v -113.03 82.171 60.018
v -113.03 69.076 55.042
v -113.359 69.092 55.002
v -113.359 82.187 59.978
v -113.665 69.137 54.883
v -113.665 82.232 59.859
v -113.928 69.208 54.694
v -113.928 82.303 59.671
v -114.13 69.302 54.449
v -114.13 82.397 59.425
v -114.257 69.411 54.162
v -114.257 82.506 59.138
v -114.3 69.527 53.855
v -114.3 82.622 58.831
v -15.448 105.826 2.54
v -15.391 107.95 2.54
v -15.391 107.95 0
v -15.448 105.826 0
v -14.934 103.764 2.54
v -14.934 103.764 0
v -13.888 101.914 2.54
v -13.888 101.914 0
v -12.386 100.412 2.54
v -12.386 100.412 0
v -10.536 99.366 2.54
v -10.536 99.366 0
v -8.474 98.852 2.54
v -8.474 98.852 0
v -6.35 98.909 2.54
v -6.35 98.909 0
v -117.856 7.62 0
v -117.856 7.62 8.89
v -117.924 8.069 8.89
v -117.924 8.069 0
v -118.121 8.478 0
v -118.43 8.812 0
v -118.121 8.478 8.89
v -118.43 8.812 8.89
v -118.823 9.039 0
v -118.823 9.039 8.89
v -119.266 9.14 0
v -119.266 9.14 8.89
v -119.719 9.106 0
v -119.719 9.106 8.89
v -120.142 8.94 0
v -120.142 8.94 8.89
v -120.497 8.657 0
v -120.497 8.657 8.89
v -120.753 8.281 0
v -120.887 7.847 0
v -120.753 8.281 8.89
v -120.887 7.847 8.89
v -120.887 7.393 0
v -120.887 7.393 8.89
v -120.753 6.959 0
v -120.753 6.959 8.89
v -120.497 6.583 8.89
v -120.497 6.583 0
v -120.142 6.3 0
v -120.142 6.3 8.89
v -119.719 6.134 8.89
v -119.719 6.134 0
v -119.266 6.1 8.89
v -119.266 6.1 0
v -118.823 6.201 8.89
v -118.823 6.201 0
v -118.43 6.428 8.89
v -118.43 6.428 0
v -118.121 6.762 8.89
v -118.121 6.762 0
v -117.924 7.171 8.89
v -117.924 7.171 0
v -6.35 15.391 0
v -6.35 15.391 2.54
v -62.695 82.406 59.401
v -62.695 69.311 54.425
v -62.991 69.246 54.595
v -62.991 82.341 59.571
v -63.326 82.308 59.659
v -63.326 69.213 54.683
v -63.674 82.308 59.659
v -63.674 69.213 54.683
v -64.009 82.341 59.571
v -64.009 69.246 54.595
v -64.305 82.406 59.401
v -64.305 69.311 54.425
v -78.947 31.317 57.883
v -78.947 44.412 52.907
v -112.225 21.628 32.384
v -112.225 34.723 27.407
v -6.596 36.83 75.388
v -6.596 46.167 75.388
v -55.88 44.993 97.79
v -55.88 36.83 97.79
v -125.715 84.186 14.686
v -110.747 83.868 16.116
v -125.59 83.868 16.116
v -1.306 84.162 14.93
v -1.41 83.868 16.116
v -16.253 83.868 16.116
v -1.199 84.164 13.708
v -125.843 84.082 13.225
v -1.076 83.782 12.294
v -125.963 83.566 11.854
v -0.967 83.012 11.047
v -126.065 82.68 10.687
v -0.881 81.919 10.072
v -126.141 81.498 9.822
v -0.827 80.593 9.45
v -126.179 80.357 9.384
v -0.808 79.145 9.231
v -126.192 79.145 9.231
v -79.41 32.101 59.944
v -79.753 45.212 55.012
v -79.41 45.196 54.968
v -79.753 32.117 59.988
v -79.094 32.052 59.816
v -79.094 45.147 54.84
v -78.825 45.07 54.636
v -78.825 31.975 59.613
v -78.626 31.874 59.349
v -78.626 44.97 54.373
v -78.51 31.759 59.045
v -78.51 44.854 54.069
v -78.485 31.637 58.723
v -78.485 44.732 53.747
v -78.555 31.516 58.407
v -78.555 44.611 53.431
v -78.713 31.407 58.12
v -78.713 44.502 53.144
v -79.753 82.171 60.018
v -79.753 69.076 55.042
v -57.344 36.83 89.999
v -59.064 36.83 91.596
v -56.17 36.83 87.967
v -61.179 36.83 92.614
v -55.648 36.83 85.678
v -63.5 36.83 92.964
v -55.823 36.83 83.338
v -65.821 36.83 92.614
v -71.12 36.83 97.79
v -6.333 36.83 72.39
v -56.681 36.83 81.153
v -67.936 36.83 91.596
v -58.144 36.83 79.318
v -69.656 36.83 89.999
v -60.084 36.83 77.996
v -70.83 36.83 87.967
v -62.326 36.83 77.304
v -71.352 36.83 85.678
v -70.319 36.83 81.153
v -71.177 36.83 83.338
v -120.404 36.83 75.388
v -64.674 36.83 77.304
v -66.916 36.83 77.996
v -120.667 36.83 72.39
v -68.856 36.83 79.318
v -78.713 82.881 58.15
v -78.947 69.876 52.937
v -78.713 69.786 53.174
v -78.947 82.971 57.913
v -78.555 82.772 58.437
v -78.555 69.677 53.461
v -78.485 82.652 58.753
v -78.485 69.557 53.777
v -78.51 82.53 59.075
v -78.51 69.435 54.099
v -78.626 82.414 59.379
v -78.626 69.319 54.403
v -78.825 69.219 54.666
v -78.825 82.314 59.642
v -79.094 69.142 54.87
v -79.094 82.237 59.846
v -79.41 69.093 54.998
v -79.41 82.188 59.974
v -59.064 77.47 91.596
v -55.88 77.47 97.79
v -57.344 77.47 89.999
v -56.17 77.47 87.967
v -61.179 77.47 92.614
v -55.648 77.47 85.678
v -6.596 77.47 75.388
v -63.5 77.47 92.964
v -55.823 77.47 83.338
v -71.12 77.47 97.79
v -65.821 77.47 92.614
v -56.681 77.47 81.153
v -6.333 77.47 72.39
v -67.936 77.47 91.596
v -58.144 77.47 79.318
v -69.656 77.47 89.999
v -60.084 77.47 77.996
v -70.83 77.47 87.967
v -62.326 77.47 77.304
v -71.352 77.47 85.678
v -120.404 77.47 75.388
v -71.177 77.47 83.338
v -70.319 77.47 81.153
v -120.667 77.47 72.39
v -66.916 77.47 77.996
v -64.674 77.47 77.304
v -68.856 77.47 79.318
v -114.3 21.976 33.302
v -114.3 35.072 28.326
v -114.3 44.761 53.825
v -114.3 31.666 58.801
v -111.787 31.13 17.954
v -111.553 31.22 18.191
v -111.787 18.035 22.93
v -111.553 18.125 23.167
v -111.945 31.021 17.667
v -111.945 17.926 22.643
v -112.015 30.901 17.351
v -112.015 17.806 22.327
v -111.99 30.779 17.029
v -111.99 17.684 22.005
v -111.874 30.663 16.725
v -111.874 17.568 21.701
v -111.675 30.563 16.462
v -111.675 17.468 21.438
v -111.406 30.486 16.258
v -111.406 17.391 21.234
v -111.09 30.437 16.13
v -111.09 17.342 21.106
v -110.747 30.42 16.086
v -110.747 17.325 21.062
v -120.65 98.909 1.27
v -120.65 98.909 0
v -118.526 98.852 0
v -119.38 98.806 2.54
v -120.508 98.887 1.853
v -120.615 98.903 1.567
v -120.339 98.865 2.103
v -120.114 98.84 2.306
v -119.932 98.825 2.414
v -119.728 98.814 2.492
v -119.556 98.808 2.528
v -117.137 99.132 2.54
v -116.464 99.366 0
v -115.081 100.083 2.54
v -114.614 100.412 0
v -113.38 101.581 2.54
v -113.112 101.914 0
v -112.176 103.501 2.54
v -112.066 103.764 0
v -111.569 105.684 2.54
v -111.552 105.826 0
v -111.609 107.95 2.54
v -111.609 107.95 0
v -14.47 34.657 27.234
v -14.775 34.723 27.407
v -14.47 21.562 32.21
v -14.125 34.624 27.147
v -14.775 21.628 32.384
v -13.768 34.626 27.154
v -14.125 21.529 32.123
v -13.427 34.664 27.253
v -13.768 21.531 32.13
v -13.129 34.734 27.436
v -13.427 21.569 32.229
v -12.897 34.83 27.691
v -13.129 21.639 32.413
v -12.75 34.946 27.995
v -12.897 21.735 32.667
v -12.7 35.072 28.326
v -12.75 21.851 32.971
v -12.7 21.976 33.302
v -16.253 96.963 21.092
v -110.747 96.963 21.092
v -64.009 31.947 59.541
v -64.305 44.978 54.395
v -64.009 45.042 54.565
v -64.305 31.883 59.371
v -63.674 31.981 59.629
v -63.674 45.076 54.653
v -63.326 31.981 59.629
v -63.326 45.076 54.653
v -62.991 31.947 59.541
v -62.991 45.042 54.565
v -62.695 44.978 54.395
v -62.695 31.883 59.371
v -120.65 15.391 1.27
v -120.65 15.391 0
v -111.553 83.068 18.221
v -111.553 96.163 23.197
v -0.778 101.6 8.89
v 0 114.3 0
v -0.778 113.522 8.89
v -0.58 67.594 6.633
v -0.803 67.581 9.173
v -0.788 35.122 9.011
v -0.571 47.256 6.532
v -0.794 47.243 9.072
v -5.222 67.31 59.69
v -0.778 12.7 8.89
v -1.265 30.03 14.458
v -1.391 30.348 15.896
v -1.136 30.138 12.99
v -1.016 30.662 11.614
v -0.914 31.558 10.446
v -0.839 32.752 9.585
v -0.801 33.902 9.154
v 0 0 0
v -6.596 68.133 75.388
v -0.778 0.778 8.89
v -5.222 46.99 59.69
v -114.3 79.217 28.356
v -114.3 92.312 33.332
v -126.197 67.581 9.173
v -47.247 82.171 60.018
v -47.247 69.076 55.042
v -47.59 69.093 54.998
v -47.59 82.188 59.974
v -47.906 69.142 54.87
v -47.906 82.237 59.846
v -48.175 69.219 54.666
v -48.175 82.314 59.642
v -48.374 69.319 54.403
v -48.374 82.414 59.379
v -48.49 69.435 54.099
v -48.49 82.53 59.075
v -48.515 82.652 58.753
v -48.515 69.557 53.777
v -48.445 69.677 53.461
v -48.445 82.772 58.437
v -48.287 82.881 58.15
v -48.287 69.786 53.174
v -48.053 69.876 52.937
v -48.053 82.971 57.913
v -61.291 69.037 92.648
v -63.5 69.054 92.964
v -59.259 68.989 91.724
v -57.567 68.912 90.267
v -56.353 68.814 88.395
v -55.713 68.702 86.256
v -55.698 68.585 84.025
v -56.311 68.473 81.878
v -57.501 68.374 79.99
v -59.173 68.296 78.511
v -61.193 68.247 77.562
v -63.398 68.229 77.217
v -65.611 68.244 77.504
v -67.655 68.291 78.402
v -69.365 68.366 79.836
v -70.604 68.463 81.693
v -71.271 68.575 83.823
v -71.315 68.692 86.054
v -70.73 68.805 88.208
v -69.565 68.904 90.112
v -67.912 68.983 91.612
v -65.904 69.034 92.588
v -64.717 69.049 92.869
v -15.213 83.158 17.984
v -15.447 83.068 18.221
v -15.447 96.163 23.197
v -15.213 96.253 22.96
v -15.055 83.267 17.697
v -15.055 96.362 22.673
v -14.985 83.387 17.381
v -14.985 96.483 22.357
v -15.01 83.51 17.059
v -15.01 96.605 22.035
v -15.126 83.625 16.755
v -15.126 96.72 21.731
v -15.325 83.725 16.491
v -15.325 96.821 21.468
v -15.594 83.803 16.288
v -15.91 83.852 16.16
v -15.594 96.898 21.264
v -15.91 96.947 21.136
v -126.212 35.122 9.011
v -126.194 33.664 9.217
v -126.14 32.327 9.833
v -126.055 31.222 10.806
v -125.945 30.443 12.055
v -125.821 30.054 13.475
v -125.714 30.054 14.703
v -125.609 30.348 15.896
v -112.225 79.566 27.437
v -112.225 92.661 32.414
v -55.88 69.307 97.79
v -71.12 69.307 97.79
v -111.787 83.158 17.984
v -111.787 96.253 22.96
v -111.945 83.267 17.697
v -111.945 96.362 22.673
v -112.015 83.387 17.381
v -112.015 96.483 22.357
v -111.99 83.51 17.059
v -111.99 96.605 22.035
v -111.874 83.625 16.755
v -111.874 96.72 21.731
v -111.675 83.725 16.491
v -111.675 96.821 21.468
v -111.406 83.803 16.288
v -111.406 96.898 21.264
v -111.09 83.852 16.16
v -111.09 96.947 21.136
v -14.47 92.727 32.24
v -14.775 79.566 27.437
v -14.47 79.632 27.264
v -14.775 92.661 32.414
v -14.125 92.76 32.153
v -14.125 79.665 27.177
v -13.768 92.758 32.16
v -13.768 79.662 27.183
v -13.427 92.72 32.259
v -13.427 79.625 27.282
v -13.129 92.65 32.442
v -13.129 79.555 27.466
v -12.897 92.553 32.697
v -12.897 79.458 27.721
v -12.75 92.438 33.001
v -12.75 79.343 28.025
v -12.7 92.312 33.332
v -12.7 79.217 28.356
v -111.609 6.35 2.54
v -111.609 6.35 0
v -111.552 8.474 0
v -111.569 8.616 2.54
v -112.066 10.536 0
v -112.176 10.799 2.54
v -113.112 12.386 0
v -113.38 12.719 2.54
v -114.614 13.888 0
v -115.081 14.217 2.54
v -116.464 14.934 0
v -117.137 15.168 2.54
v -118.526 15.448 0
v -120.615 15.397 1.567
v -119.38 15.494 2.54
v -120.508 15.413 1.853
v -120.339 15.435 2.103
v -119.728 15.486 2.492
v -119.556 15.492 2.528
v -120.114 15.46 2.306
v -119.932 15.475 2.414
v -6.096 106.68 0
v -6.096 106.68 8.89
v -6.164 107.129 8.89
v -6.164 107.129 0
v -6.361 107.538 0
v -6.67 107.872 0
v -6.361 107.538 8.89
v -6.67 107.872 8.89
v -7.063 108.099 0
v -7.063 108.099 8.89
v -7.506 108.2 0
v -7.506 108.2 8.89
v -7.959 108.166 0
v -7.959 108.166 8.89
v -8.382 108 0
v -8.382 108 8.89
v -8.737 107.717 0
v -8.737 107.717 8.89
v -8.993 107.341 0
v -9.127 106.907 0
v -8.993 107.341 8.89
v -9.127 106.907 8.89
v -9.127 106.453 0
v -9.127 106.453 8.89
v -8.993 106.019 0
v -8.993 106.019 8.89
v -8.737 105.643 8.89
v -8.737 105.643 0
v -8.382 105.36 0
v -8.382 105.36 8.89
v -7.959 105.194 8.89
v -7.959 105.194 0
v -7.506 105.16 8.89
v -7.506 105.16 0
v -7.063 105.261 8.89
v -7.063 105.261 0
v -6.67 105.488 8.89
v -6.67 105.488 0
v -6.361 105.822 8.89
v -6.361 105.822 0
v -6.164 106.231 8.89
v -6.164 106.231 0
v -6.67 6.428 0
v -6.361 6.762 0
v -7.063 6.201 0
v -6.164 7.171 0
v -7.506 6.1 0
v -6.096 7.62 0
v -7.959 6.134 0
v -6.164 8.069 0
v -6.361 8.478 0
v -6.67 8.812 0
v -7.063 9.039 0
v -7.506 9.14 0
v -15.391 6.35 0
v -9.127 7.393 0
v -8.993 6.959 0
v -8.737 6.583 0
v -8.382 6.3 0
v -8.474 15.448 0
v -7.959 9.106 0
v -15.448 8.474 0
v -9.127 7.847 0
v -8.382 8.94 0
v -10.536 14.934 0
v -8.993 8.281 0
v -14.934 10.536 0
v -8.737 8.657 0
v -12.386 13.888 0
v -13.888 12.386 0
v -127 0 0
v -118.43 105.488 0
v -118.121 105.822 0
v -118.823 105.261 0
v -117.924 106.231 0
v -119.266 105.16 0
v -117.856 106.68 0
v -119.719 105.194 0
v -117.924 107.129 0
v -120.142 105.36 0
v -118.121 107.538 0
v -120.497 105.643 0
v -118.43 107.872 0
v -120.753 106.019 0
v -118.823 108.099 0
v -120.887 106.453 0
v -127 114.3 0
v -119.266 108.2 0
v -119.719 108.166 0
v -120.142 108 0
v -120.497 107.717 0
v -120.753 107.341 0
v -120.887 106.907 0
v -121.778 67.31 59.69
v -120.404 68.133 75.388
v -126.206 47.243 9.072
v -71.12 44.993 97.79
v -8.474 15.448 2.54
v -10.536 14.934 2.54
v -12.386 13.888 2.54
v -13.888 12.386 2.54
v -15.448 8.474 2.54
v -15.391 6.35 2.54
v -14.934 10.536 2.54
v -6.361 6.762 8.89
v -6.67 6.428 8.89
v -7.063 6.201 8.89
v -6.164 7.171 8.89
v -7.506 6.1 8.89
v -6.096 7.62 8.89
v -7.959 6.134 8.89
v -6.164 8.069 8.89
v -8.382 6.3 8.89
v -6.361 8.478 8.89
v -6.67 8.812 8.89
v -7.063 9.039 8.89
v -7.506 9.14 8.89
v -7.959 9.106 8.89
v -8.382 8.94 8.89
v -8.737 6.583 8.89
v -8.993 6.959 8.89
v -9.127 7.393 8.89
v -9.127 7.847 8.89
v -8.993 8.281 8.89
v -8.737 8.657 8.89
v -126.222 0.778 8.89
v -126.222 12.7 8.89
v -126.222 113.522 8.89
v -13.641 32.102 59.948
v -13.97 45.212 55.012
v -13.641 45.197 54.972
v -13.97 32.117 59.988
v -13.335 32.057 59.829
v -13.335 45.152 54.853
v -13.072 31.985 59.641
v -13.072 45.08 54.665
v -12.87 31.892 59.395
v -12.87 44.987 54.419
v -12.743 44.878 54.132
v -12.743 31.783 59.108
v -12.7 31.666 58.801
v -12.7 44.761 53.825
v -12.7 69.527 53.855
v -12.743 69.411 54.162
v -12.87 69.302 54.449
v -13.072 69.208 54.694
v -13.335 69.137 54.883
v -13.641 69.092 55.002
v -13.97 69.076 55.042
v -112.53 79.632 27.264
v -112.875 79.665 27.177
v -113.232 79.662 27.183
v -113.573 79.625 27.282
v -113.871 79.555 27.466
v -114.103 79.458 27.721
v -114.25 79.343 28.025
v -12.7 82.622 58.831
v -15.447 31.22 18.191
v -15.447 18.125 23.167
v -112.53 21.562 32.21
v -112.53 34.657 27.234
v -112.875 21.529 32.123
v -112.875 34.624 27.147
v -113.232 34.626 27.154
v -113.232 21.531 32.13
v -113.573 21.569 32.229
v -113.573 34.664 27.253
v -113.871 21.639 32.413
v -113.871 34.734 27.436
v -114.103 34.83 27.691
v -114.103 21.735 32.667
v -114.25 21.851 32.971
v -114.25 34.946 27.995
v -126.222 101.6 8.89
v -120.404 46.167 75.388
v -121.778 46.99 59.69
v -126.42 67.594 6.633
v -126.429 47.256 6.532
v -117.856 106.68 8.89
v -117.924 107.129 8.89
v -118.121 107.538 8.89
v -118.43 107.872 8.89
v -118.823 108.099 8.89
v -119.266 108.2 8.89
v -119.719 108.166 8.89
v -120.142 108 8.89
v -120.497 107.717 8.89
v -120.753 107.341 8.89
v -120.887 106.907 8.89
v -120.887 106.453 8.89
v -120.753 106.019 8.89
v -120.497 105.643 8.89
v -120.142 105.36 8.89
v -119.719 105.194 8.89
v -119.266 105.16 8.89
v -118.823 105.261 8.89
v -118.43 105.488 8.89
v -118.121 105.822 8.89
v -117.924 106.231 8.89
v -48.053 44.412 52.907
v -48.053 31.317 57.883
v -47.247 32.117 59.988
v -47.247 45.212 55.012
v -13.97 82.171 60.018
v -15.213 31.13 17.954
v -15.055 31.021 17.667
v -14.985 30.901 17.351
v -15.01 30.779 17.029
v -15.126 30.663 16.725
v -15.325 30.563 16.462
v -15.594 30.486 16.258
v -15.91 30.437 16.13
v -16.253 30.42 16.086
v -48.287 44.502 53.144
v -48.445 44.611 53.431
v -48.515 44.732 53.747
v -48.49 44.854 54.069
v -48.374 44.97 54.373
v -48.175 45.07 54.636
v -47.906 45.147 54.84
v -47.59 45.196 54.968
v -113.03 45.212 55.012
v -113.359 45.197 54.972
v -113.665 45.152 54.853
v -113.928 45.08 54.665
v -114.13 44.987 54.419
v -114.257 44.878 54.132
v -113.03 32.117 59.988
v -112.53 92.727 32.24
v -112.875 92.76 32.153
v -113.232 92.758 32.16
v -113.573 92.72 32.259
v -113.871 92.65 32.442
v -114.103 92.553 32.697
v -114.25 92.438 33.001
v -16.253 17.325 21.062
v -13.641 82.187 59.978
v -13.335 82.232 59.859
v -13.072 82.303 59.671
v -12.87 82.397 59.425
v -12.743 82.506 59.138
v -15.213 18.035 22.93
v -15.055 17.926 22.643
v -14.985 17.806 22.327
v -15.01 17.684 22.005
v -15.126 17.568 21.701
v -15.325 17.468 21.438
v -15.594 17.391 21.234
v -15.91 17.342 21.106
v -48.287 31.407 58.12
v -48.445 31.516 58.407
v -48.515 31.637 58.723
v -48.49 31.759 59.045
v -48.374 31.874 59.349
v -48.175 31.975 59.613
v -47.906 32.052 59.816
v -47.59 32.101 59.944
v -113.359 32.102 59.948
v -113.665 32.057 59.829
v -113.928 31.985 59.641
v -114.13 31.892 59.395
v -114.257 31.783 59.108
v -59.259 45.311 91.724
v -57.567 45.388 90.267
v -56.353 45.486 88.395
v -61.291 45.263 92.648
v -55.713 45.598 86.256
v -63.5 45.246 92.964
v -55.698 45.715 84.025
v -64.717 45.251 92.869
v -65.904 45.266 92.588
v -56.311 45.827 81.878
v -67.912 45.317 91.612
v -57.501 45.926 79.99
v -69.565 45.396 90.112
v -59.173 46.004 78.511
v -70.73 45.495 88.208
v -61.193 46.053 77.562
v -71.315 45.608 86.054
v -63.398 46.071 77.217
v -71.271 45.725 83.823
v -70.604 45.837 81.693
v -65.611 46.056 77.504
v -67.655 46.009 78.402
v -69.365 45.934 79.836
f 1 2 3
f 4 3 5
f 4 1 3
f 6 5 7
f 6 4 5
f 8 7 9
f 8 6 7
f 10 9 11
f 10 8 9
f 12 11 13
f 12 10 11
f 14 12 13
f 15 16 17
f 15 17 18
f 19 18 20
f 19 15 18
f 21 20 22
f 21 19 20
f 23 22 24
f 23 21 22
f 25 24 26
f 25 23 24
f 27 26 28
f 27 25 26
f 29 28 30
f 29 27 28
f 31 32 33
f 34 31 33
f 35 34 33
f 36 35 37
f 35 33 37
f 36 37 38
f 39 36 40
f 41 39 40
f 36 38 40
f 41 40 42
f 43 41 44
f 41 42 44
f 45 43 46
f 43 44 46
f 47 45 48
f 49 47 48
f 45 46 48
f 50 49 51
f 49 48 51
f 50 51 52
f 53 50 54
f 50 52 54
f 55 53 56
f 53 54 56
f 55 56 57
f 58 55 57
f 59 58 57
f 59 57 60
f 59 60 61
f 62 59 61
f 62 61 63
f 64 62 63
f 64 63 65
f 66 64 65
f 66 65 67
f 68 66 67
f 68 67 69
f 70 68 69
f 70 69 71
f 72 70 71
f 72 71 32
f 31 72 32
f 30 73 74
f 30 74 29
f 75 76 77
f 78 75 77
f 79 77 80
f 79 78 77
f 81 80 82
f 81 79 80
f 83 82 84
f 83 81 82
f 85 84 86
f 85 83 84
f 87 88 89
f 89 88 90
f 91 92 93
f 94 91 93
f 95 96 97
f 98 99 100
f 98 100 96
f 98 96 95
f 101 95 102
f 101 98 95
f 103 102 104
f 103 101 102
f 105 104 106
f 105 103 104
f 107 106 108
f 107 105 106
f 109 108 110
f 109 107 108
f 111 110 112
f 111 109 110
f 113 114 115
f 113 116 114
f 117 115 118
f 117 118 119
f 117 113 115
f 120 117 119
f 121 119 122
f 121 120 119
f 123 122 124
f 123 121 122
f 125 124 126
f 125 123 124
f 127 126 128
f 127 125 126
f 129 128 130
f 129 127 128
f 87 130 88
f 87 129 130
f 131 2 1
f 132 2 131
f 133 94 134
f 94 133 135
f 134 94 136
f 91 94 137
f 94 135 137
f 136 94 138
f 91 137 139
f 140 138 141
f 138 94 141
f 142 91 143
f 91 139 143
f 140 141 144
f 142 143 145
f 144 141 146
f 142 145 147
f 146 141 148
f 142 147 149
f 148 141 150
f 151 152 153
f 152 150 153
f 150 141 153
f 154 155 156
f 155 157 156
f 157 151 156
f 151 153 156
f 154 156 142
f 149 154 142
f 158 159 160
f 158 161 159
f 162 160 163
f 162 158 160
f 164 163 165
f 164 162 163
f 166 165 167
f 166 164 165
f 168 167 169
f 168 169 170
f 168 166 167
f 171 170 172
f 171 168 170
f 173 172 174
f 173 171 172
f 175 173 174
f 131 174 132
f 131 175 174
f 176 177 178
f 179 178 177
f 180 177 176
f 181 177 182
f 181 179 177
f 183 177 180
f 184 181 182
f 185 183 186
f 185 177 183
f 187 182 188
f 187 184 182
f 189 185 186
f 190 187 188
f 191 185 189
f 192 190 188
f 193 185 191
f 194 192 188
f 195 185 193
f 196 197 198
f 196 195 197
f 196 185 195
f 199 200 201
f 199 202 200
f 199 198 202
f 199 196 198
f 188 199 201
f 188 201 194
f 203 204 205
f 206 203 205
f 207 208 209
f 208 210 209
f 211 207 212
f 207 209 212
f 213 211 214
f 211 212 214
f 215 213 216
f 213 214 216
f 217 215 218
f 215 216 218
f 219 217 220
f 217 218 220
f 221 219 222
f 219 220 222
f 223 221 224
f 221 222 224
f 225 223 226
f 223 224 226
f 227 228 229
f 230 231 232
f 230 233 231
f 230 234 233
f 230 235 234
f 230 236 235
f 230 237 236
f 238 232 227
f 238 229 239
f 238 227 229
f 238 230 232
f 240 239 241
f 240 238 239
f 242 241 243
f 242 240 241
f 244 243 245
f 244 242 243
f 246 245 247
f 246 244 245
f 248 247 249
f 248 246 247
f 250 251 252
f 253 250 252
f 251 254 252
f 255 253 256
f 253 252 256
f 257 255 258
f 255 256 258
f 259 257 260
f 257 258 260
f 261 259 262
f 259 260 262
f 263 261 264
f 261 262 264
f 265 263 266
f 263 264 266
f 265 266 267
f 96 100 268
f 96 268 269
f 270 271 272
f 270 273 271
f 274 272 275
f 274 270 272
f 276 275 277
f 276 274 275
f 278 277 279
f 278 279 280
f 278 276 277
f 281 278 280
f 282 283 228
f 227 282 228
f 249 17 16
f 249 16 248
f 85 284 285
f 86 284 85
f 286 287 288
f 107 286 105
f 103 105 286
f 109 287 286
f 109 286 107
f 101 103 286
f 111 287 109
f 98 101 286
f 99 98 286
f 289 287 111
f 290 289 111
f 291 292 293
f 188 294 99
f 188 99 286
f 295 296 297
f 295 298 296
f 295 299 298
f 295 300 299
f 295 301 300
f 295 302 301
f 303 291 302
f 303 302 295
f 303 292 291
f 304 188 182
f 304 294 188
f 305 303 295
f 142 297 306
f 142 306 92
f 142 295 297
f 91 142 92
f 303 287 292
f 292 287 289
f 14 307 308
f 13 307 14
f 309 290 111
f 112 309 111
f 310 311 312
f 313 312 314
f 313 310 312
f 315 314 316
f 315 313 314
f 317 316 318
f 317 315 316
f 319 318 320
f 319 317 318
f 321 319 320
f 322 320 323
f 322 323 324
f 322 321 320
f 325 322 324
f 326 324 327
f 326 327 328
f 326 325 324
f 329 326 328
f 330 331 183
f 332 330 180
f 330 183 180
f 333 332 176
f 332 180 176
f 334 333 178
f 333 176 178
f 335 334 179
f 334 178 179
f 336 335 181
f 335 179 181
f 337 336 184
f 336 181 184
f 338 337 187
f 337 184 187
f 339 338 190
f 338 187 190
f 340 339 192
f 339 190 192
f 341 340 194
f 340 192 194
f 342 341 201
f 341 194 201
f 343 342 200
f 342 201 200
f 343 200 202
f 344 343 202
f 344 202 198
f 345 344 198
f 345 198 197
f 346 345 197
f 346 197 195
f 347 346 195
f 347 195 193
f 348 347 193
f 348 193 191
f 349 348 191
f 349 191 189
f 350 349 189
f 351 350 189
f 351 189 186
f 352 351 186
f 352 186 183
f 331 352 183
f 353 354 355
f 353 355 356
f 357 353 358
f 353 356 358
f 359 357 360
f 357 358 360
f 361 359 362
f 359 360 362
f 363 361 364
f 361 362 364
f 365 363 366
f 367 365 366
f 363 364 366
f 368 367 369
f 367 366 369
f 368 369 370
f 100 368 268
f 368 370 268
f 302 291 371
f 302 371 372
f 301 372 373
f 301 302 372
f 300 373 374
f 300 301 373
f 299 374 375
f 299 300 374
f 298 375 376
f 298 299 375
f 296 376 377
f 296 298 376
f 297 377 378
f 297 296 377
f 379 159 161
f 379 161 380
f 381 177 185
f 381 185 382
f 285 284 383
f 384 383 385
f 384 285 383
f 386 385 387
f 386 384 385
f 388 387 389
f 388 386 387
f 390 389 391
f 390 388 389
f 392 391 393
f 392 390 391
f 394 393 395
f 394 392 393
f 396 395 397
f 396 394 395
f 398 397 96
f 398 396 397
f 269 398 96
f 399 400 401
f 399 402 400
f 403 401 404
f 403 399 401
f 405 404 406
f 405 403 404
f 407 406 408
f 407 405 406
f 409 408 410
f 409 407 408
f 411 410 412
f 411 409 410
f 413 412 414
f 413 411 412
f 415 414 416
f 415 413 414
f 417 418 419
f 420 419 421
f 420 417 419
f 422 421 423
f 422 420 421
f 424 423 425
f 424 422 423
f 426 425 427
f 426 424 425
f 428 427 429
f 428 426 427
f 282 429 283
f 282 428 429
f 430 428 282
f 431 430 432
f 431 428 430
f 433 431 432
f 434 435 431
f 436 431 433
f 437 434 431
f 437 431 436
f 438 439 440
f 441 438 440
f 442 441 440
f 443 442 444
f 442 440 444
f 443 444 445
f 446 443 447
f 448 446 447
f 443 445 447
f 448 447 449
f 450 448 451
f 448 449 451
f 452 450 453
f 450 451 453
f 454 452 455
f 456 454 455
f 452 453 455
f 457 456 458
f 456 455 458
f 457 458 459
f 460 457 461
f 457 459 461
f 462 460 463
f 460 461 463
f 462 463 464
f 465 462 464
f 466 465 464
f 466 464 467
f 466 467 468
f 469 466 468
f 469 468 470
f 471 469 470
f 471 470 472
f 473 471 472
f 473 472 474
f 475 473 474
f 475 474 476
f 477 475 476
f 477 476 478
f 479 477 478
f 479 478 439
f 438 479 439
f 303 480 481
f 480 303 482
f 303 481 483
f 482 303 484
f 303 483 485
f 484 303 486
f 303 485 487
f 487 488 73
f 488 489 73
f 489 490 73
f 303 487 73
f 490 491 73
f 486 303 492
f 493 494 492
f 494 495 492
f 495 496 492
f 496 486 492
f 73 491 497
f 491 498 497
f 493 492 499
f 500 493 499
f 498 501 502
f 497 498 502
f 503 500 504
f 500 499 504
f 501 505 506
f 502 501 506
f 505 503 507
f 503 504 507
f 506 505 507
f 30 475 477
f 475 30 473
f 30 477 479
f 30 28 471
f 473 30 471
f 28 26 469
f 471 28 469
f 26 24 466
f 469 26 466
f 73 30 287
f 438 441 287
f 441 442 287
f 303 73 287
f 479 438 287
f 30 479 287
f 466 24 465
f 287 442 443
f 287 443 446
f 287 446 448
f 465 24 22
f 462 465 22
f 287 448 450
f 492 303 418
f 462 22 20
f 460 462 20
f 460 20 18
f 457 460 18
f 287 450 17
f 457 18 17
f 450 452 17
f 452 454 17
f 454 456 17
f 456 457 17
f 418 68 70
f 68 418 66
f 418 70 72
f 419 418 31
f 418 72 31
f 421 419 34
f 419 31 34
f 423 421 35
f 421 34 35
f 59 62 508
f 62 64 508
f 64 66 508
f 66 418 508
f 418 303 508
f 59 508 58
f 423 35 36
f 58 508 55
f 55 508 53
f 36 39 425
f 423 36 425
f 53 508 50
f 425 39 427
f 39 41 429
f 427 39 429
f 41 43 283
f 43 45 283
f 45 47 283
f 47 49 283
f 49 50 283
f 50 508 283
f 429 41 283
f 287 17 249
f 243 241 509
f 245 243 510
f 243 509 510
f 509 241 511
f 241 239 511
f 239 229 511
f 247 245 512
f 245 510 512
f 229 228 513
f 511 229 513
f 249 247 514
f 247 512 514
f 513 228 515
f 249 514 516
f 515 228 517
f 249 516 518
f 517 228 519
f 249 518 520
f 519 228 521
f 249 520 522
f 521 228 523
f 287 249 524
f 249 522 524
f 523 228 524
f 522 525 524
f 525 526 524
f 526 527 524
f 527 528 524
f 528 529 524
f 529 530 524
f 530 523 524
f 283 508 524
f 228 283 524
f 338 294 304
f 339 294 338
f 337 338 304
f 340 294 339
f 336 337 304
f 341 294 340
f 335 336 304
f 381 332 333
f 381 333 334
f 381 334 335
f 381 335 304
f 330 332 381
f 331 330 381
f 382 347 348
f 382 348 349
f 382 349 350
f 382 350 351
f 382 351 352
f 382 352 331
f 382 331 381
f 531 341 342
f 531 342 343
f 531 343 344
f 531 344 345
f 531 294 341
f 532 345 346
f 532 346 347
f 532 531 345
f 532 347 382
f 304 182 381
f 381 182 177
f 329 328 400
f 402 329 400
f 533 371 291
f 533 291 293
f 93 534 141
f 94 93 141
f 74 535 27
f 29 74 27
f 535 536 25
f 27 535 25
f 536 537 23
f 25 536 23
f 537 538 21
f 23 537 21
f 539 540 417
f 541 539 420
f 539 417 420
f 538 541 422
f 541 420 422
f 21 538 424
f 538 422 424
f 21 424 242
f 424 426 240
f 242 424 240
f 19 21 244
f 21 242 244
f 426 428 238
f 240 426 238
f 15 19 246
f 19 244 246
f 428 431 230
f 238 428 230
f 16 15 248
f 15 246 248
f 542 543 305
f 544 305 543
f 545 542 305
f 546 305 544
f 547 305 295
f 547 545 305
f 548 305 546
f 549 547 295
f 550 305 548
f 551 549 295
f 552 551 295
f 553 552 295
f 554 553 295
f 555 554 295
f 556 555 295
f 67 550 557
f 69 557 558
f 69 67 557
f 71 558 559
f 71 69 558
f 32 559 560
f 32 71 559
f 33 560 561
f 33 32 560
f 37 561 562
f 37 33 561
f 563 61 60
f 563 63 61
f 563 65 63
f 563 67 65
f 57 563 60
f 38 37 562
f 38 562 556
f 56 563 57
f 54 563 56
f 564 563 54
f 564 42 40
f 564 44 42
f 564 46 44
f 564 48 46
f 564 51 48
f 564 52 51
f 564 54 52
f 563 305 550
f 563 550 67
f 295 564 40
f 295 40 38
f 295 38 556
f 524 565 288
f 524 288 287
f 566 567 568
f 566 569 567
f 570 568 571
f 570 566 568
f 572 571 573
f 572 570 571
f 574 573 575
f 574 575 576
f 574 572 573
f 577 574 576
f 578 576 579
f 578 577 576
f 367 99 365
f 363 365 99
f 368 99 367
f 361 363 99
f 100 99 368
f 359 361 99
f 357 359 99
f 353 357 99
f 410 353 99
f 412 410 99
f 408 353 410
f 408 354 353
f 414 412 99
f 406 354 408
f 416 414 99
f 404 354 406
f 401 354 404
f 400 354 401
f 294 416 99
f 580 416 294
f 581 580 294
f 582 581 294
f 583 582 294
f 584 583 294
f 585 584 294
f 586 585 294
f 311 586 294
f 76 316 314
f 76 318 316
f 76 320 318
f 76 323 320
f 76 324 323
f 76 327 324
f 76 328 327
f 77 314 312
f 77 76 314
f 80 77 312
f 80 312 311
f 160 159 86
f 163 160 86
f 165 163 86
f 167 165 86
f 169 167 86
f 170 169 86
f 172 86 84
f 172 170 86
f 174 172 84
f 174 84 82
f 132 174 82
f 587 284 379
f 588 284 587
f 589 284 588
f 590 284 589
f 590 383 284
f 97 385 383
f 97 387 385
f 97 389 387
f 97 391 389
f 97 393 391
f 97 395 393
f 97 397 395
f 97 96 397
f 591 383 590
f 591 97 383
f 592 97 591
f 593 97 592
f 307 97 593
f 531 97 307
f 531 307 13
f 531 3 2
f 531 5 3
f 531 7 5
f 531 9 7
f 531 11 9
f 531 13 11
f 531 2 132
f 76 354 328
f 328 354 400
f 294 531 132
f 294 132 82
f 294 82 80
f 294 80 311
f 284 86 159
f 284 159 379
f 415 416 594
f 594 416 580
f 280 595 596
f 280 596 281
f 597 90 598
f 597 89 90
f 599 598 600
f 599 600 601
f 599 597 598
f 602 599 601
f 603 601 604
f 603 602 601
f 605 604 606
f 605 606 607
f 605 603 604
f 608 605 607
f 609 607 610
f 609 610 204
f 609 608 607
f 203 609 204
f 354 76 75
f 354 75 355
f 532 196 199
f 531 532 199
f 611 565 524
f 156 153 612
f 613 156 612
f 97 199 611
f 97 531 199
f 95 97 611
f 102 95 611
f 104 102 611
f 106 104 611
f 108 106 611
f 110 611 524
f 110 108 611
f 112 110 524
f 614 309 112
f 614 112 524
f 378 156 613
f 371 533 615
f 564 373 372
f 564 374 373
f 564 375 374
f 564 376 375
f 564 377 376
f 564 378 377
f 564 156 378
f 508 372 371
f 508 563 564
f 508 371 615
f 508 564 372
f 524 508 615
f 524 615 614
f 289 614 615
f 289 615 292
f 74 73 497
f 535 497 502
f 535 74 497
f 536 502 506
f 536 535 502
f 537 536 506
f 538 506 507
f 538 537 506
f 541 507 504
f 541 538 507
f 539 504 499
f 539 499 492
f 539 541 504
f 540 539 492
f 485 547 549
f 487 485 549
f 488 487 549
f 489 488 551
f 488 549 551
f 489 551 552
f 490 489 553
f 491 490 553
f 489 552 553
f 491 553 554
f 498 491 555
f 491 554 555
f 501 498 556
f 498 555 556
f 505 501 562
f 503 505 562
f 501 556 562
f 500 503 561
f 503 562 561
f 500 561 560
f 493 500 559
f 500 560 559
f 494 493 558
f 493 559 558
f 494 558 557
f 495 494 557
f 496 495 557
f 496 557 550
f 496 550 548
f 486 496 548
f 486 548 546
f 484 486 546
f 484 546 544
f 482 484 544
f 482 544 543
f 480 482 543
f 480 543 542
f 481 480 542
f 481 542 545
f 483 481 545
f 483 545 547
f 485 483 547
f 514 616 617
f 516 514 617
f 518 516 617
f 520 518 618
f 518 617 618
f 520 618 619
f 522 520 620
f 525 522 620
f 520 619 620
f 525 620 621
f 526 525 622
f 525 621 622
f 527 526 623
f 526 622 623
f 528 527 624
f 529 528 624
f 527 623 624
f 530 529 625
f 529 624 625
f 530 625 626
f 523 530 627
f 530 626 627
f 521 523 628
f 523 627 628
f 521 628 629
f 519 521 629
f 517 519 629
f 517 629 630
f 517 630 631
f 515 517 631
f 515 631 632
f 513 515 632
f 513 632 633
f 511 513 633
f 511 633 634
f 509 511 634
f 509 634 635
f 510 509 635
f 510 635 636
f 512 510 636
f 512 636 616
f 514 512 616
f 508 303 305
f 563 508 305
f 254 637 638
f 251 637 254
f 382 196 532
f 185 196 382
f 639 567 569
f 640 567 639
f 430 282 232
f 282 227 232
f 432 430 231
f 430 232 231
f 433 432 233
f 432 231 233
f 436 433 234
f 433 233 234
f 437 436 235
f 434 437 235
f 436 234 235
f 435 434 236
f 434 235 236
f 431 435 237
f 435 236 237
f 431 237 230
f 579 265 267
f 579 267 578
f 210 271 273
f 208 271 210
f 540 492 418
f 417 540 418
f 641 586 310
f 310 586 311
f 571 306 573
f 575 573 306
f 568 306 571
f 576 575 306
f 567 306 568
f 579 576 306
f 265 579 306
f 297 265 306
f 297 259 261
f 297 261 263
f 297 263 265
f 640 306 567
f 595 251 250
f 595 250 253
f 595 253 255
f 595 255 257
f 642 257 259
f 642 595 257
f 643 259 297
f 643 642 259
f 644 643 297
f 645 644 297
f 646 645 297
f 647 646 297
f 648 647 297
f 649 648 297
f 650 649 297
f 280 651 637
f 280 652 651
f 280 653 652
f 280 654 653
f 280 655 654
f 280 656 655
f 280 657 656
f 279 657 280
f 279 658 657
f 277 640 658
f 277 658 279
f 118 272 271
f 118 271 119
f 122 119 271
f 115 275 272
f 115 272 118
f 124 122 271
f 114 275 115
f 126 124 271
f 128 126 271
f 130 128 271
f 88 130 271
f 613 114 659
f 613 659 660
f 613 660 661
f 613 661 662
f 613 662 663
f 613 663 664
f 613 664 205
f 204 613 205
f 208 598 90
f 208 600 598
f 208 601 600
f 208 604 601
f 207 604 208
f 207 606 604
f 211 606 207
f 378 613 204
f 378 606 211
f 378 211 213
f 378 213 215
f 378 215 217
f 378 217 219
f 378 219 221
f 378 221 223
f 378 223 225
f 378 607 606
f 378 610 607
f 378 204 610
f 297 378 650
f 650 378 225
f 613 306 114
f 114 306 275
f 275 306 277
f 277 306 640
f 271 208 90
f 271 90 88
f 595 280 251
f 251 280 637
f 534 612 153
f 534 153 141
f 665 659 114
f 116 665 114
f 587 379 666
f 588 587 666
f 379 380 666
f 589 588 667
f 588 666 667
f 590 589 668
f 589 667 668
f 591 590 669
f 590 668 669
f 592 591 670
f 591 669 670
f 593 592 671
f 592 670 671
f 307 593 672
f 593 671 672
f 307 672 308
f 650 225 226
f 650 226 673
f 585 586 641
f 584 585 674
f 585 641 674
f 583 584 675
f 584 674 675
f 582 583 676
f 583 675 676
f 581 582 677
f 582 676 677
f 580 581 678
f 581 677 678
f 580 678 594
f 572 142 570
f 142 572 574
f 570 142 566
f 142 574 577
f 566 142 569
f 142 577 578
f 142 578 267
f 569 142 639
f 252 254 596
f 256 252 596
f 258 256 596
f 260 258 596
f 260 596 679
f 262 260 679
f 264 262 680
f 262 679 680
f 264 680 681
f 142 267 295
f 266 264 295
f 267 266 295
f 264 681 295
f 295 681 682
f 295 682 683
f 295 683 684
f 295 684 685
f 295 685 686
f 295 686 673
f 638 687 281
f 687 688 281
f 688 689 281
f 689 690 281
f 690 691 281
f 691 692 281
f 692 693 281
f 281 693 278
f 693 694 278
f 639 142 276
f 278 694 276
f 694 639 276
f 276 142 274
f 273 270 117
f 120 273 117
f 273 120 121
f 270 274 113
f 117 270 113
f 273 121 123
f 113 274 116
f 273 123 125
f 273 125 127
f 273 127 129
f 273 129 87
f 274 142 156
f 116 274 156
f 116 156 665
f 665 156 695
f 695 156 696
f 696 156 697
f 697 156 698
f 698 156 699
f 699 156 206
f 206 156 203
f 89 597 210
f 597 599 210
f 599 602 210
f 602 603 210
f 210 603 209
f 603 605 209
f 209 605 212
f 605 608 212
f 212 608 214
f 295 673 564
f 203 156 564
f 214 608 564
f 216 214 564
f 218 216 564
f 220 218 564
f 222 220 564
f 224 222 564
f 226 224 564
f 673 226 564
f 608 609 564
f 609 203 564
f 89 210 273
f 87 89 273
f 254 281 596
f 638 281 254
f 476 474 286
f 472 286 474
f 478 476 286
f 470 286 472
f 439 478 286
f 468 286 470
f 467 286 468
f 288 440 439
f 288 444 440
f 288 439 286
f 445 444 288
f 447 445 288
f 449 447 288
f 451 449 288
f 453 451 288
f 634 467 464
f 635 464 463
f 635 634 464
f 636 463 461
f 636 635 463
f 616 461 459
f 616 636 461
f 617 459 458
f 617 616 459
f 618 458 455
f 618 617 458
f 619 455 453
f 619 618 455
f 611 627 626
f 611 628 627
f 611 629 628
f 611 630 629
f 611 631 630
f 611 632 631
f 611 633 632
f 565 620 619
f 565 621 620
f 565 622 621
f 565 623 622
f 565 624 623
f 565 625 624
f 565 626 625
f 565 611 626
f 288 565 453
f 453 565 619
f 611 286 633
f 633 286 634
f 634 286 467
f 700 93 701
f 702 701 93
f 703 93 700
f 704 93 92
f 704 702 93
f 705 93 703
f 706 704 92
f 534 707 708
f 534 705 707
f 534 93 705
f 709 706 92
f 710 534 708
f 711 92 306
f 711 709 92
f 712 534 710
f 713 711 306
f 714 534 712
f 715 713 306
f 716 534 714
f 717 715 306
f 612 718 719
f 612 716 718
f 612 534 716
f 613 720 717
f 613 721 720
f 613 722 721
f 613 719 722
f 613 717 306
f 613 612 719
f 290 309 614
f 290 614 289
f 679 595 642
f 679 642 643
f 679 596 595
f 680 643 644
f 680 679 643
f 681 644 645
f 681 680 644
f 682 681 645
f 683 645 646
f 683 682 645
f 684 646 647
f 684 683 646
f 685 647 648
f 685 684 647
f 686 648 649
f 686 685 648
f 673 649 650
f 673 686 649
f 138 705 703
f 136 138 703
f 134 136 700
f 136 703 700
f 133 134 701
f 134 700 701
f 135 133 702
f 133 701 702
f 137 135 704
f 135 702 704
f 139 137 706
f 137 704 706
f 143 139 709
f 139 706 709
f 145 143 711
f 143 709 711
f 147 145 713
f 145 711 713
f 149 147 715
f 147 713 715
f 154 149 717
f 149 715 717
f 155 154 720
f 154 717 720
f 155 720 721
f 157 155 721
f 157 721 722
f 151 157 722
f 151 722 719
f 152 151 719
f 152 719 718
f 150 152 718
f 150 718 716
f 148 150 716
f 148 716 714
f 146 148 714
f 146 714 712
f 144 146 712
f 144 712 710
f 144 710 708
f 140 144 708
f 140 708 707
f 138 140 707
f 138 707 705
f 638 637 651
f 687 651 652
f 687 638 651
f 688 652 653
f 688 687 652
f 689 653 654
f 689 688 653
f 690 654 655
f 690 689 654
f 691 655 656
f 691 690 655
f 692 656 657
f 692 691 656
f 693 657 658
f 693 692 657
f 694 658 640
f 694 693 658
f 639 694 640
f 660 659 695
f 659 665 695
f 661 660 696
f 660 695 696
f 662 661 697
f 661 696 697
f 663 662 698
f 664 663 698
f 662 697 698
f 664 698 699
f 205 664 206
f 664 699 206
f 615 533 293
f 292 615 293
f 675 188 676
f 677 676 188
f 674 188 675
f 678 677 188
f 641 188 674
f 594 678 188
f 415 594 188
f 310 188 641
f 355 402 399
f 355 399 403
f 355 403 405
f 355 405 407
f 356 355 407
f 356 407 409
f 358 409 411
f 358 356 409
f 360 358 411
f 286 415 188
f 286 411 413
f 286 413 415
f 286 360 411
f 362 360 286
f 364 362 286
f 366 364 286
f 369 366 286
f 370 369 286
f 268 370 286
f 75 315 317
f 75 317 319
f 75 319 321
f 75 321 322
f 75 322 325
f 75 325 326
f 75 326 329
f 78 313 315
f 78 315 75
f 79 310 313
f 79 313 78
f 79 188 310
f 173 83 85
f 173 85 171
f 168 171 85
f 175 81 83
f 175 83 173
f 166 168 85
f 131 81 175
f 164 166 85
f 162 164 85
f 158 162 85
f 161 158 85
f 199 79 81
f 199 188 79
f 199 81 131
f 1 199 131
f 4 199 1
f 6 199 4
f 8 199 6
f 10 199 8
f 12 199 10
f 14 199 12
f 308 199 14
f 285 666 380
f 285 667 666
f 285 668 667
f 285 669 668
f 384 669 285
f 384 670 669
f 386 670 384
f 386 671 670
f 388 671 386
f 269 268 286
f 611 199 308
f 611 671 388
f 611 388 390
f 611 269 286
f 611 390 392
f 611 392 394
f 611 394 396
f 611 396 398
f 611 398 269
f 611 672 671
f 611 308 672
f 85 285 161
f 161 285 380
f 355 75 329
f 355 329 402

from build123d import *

# Parameters (mm, degrees)
SKETCH3_W           = 114.3
SKETCH3_H           = 127
BOSS_EXTRUDE1_DEPTH = 8.89
SKETCH5_R           = 1.524
CUT_EXTRUDE1_DEPTH  = 172.092145056
SHELL2_T            = -6.35
SKETCH6_W           = 88.9
SKETCH6_H           = 127
BOSS_EXTRUDE2_DEPTH = 88.9
SKETCH8_R           = 7.874
CUT_EXTRUDE2_DEPTH  = 190.774719338
CUT_EXTRUDE3_DEPTH  = 197.866386415
FILLET1_R           = 5.08
CUT_EXTRUDE4_DEPTH  = 165.086159295
CUT_EXTRUDE5_DEPTH  = 190.725297655
FILLET2_R           = 1.27
SKETCH20_W          = 127
SKETCH20_H          = 20.338660629
CUT_EXTRUDE7_DEPTH  = 2.54
DRAFT6_DEPTH        = 114.3
DRAFT6_START        = -128
DRAFT6_2_DEPTH      = 129
DRAFT7_ANGLE        = 3


with BuildPart() as part:
    # Sketch3 → Boss-Extrude1 (new body)
    with BuildSketch(Plane(origin=(0, 0, 0), x_dir=(0, 1, 0), z_dir=(0, 0, 1))):
        with Locations((57.15, 63.5)):
            Rectangle(SKETCH3_W, SKETCH3_H)
    extrude(amount=BOSS_EXTRUDE1_DEPTH)

    # Sketch5 → Cut-Extrude1 (cut, through all)
    with BuildSketch(Plane.XY.offset(8.89)):
        with Locations((-119.38, 7.62)):
            Circle(SKETCH5_R)
        with Locations((-7.62, 7.62)):
            Circle(SKETCH5_R)
        with Locations((-119.38, 106.68)):
            Circle(SKETCH5_R)
        with Locations((-7.62, 106.68)):
            Circle(SKETCH5_R)
    extrude(amount=-CUT_EXTRUDE1_DEPTH, mode=Mode.SUBTRACT)

    # Shell2
    shell2_openings = [part.faces().sort_by_distance(p)[0] for p in [
        (-63.5, 57.15, 0),
    ]]
    offset(amount=SHELL2_T, openings=shell2_openings)

    # Sketch6 → Boss-Extrude2 (add)
    with BuildSketch(Plane(origin=(0, 0, 8.89), x_dir=(0, -1, 0), z_dir=(0, 0, 1))):
        with Locations((-57.15, -63.5)):
            Rectangle(SKETCH6_W, SKETCH6_H)
    extrude(amount=BOSS_EXTRUDE2_DEPTH)

    # Sketch8 → Cut-Extrude2 (cut, through all)
    with BuildSketch(Plane(origin=(0, 101.6, 0), x_dir=(-1, 0, 0), z_dir=(0, 1, 0))):
        with Locations(Location((63.5, 85.09, 0), (0, 0, 90))):
            Circle(SKETCH8_R)
        Polygon((55.88, 97.79), (0, 97.79), (0, 72.39), align=None)
        Polygon((71.12, 97.79), (127, 97.79), (127, 72.39), align=None)
    extrude(amount=-CUT_EXTRUDE2_DEPTH, mode=Mode.SUBTRACT)

    # Sketch9 → Cut-Extrude3 (cut, through all)
    with BuildSketch(Plane(origin=(-127, 0, 0), x_dir=(0, -1, 0), z_dir=(-1, 0, 0))):
        Polygon((-67.31, 97.79), (-46.99, 97.79), (-46.99, 59.69), (-27.718040346, 8.974316699), (-86.47043568, 9.267800843), (-67.31, 59.69), align=None)
        Polygon((-77.47, 97.79), (-77.47, 72.39), (-101.6, 8.89), (-101.6, 97.79), align=None)
        Polygon((-36.83, 97.79), (-36.83, 72.39), (-12.7, 8.89), (-12.7, 97.79), align=None)
    extrude(amount=-CUT_EXTRUDE3_DEPTH, mode=Mode.SUBTRACT)

    # Fillet1
    fillet1_edges = [part.edges().sort_by_distance(p)[0] for p in [
        (-63.5, 27.718040346, 8.974316699),
        (-63.5, 86.47043568, 9.267800843),
    ]]
    fillet(fillet1_edges, radius=FILLET1_R)

    # Sketch16 → Cut-Extrude4 (cut, through all)
    with BuildSketch(Plane(origin=(0, 78.63701503, 29.882065711), x_dir=(1, 0, 0), z_dir=(0, -0.9347835805883491, -0.3552177606235725))):
        Polygon((-12.7, -14.726847163), (-114.3, -14.726847163), (-63.5, 26.915400792), align=None)
        Polygon((-12.7, 26.915400792), (-50.8, 26.915400792), (-12.7, -4.316285174), align=None)
        Polygon((-114.3, -4.316285174), (-114.3, 26.915400792), (-76.2, 26.915400792), align=None)
    extrude(amount=-CUT_EXTRUDE4_DEPTH, mode=Mode.SUBTRACT)

    # Sketch17 → Cut-Extrude5 (cut, through all)
    with BuildSketch(Plane(origin=(0, 21.240650122, -8.071447046), x_dir=(-1, 0, 0), z_dir=(0, 0.934783580588349, -0.3552177606235728))):
        Polygon((114.3, 25.842533623), (12.7, 25.842533623), (63.5, 67.484781577), align=None)
        Polygon((114.3, 67.484781577), (76.2, 67.484781577), (114.3, 36.253095611), align=None)
        Polygon((12.7, 36.253095611), (12.7, 67.484781577), (50.8, 67.484781577), align=None)
    extrude(amount=-CUT_EXTRUDE5_DEPTH, mode=Mode.SUBTRACT)

    # Fillet2
    fillet2_edges = [part.edges().sort_by_distance(p)[0] for p in [
        (-76.2, 75.623722461, 57.530204051),
        (-114.3, 86.71777201, 28.335336816),
        (-114.3, 75.623722461, 57.530204051),
        (-12.7, 75.623722461, 57.530204051),
        (-12.7, 86.71777201, 28.335336816),
        (-50.8, 75.623722461, 57.530204051),
        (-12.7, 90.415788526, 18.603714404),
        (-63.5, 75.623722461, 57.530204051),
        (-114.3, 90.415788526, 18.603714404),
        (-50.8, 38.664907284, 57.500282325),
        (-12.7, 27.570857734, 28.30541509),
        (-12.7, 38.664907284, 57.500282325),
        (-114.3, 38.664907284, 57.500282325),
        (-114.3, 27.570857734, 28.30541509),
        (-76.2, 38.664907284, 57.500282325),
        (-63.5, 38.664907284, 57.500282325),
        (-114.3, 23.872841218, 18.573792679),
        (-12.7, 23.872841218, 18.573792679),
        (-120.65, 57.15, 2.54),
    ]]
    fillet(fillet2_edges, radius=FILLET2_R)

    # Sketch20 → Cut-Extrude7 (cut)
    with BuildSketch(Plane(origin=(0, -0.044136403, 8.8356371), x_dir=(1, 0, 0), z_dir=(0, -0.004995208795198877, 0.9999875238667193))):
        with Locations((-63.5, 57.456908074)):
            Rectangle(SKETCH20_W, SKETCH20_H)
    extrude(amount=-CUT_EXTRUDE7_DEPTH, mode=Mode.SUBTRACT)

    # Draft6: read off the stored shape, not the designer's step
    # Draft6 outline → Draft6 (cut)
    with BuildSketch(Plane(origin=(0, 0, 0), x_dir=(1, 0, 0), z_dir=(0, 1, 0))):
        Polygon((-120.404404826, -75.387997806), (-127, 0), (-127, -72.39), align=None)
        Polygon((0, 0), (-6.595595174, -75.387997806), (0, -72.39), align=None)
    extrude(amount=DRAFT6_DEPTH, mode=Mode.SUBTRACT)

    # Draft6 2 outline → Draft6 2 (cut)
    with BuildSketch(Plane.YZ.offset(DRAFT6_START)):
        Polygon((0, 0), (0.777774219, 8.89), (0, 8.89), align=None)
        Polygon((113.522225781, 8.89), (114.3, 0), (114.3, 8.89), align=None)
    extrude(amount=DRAFT6_2_DEPTH, mode=Mode.SUBTRACT)

    # Draft7
    draft7_faces = [part.faces().sort_by_distance(p)[0] for p in [
        (-63.5, 46.99, 74.057550682),
        (-63.5, 67.31, 74.057550682),
    ]]
    draft(draft7_faces, Plane(origin=(0, 0, 59.69), x_dir=(0, 1, 0), z_dir=(0, 0, 1)), DRAFT7_ANGLE)


solid = part.part
